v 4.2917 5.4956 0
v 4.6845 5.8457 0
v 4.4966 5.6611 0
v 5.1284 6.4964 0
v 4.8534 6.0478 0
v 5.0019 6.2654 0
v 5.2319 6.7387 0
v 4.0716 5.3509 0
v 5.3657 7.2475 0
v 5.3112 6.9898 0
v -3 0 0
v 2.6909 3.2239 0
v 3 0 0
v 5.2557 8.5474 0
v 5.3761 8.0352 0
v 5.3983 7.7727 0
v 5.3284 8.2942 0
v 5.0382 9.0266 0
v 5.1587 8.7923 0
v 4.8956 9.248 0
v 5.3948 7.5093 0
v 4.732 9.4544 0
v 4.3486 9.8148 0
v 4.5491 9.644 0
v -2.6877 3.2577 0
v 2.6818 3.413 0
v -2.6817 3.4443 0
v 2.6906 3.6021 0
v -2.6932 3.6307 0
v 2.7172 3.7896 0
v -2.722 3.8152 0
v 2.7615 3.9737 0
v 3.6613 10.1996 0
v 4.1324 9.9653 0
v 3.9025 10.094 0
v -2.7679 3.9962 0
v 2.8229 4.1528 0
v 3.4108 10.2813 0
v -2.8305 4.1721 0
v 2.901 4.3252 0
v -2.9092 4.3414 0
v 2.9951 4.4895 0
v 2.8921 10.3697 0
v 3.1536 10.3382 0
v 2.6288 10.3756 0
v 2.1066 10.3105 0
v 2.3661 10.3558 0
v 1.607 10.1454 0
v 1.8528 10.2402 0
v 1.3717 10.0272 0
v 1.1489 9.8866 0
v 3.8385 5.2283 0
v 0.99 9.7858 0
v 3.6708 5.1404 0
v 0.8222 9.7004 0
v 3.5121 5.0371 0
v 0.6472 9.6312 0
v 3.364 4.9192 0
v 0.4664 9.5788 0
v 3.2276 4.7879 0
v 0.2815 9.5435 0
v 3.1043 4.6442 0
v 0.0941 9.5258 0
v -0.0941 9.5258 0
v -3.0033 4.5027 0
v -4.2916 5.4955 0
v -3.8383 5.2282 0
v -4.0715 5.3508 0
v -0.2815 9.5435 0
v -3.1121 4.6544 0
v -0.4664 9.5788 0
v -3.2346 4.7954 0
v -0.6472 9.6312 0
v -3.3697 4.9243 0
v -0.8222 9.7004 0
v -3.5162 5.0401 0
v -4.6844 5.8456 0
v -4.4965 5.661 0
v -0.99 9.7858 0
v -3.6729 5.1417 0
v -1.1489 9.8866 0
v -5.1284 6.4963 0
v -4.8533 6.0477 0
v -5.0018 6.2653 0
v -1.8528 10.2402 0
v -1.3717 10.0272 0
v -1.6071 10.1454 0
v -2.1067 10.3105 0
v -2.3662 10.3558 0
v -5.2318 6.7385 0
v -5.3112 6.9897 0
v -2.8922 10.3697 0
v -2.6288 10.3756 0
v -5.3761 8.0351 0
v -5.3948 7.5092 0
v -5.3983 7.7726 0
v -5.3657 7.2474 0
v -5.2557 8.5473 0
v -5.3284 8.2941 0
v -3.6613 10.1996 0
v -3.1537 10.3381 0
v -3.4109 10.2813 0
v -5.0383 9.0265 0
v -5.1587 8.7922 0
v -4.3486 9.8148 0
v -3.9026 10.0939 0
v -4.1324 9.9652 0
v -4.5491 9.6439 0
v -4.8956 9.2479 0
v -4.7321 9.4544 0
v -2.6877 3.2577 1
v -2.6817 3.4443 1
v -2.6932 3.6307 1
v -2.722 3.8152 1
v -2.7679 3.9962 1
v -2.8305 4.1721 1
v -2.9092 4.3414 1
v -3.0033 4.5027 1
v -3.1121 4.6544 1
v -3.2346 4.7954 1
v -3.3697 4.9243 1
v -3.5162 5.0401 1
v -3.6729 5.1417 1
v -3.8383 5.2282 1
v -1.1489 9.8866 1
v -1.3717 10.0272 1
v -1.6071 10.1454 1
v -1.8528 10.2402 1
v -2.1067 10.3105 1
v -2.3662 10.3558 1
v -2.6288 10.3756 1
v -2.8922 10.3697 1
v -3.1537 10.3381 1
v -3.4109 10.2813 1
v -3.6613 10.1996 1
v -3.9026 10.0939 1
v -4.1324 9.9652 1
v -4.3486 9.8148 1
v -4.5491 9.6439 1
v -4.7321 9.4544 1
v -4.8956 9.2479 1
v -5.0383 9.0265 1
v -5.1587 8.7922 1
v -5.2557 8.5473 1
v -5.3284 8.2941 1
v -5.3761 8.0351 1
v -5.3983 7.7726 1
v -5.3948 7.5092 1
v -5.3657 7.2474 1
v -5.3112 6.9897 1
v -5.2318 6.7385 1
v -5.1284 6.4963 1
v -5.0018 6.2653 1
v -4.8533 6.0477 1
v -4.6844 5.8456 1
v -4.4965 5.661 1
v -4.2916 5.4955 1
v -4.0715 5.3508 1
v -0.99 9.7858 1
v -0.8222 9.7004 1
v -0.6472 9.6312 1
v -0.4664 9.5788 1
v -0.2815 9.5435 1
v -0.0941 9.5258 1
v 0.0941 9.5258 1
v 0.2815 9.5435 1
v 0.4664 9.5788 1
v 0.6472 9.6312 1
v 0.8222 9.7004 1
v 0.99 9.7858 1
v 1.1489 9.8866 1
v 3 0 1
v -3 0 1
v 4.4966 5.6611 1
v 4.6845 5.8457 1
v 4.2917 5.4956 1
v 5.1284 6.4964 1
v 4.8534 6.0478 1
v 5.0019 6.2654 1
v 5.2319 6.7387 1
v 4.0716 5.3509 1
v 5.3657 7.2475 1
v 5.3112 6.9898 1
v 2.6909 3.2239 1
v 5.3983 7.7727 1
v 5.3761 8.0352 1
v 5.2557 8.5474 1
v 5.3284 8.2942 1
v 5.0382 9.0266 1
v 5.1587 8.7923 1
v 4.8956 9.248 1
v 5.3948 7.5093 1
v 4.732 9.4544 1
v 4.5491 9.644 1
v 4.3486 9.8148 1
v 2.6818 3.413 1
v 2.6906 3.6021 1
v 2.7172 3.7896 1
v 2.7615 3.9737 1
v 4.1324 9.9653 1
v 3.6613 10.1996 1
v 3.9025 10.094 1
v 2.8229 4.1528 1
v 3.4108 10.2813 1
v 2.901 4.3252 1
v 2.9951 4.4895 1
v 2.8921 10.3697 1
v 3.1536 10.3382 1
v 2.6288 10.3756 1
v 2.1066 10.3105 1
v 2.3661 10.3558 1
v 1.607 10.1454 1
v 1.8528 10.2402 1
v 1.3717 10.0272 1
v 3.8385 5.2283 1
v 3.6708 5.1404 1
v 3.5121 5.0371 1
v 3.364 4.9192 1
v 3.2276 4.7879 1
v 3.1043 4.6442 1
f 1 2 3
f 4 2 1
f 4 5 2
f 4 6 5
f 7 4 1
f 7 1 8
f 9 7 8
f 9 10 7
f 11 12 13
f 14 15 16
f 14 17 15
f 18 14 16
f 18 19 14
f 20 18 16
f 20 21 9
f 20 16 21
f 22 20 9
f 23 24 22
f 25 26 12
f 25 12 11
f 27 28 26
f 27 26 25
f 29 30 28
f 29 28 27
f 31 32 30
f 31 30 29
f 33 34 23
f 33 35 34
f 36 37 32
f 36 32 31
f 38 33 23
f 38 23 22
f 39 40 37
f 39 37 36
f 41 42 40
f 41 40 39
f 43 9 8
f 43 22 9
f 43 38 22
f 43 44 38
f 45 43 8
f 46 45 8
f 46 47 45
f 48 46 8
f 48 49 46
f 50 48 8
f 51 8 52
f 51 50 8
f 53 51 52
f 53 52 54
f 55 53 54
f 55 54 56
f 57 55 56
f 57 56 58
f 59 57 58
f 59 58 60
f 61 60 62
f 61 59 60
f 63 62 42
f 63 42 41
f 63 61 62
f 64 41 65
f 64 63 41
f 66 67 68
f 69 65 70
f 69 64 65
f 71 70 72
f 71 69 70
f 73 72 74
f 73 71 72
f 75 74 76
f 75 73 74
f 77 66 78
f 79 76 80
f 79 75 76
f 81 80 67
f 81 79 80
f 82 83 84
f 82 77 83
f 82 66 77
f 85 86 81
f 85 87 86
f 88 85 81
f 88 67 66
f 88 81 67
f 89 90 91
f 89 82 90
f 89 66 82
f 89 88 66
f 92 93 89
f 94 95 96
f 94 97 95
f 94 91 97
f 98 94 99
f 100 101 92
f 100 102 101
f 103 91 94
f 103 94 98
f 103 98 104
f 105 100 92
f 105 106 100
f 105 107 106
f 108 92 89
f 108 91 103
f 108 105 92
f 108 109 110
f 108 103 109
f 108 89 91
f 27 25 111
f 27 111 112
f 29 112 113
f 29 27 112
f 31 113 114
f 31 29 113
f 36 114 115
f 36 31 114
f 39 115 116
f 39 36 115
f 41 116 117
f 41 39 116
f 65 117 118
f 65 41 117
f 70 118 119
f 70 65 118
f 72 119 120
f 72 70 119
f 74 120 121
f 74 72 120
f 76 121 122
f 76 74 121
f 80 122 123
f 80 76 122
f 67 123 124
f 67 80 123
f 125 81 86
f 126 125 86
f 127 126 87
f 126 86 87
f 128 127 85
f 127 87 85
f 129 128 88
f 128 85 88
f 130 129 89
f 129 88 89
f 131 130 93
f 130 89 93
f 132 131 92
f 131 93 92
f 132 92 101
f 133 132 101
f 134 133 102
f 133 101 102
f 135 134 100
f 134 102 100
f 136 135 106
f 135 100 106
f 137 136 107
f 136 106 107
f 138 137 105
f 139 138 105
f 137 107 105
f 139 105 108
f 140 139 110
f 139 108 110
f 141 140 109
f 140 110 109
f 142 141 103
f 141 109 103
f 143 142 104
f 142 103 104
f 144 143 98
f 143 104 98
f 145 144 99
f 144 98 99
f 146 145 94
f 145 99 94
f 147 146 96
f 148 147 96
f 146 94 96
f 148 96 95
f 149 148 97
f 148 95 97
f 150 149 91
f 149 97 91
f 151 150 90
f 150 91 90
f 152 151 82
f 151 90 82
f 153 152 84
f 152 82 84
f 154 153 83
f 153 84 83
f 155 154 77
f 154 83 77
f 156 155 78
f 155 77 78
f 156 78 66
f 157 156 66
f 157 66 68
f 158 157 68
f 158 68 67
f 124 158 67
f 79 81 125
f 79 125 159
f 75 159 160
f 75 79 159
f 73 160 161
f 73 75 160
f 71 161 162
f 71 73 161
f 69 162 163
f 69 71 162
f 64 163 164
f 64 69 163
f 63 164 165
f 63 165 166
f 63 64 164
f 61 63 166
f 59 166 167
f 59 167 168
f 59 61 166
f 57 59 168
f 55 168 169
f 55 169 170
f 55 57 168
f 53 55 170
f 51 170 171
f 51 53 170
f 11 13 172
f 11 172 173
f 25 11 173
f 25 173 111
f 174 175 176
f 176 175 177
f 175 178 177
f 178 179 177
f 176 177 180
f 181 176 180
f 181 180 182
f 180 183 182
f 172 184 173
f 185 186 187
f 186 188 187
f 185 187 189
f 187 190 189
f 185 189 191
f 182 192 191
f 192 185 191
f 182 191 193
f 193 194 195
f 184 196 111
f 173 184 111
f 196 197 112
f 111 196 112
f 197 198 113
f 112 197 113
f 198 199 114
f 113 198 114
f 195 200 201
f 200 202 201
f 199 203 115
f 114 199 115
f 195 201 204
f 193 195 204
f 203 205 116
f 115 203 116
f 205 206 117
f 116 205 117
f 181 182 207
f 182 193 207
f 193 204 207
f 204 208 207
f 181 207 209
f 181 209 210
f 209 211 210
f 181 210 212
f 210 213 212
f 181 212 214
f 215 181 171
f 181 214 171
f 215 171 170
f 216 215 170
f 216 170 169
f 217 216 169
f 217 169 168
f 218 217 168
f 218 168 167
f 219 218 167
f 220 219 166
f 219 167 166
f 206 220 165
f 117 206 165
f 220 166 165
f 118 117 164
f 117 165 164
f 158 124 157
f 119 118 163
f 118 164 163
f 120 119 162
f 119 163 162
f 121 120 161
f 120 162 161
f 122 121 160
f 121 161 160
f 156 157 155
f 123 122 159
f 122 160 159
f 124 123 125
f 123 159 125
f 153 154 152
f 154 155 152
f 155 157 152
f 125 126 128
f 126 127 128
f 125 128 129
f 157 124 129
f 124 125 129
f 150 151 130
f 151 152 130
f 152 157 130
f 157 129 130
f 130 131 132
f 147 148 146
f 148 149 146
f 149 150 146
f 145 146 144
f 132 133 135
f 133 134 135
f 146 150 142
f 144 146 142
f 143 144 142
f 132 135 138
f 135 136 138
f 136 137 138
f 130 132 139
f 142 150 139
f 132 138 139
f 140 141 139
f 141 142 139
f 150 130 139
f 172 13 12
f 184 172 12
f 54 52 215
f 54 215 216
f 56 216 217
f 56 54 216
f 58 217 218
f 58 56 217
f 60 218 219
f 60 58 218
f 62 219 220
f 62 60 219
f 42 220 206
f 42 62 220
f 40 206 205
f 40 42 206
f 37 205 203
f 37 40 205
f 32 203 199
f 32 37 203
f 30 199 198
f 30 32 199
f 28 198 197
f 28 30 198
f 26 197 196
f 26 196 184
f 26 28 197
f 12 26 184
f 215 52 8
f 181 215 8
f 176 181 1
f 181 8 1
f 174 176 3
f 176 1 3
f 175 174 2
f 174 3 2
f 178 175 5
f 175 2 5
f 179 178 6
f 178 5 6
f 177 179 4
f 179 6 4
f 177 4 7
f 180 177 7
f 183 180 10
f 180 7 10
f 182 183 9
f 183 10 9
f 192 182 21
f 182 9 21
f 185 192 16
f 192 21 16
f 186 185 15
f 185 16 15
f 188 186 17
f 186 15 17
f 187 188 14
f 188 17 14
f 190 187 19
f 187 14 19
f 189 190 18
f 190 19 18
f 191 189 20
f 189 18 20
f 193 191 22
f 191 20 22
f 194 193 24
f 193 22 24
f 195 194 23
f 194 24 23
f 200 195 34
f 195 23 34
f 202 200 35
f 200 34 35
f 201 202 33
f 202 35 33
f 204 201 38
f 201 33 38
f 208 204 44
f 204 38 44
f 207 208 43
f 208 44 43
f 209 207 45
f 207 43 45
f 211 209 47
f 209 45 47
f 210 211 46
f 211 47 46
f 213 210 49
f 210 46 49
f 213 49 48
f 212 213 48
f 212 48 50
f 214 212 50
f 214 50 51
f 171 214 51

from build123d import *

# Parameters (mm, degrees)
PAD_DEPTH = 1


with BuildPart() as part:
    # Sketch → Pad (new body)
    with BuildSketch(Plane.XY):
        with BuildLine():
            Line((3, 0), (-3, 0))
            Line((-3, 0), (-2.687677, 3.257669))
            ThreePointArc((-2.687677, 3.257669), (-2.954386, 4.423147), (-3.838312, 5.228222))
            ThreePointArc((-1.148945, 9.886566), (-5.038297, 9.026488), (-3.838312, 5.228222))
            ThreePointArc((-1.148945, 9.886566), (-6e-06, 9.523614), (1.148936, 9.88656))
            ThreePointArc((3.838472, 5.228297), (5.03825, 9.02657), (1.148936, 9.88656))
            ThreePointArc((3.838472, 5.228297), (2.946118, 4.408497), (2.690913, 3.223914))
            Line((3, 0), (2.690913, 3.223914))
        make_face()
    extrude(amount=PAD_DEPTH)


solid = part.part
